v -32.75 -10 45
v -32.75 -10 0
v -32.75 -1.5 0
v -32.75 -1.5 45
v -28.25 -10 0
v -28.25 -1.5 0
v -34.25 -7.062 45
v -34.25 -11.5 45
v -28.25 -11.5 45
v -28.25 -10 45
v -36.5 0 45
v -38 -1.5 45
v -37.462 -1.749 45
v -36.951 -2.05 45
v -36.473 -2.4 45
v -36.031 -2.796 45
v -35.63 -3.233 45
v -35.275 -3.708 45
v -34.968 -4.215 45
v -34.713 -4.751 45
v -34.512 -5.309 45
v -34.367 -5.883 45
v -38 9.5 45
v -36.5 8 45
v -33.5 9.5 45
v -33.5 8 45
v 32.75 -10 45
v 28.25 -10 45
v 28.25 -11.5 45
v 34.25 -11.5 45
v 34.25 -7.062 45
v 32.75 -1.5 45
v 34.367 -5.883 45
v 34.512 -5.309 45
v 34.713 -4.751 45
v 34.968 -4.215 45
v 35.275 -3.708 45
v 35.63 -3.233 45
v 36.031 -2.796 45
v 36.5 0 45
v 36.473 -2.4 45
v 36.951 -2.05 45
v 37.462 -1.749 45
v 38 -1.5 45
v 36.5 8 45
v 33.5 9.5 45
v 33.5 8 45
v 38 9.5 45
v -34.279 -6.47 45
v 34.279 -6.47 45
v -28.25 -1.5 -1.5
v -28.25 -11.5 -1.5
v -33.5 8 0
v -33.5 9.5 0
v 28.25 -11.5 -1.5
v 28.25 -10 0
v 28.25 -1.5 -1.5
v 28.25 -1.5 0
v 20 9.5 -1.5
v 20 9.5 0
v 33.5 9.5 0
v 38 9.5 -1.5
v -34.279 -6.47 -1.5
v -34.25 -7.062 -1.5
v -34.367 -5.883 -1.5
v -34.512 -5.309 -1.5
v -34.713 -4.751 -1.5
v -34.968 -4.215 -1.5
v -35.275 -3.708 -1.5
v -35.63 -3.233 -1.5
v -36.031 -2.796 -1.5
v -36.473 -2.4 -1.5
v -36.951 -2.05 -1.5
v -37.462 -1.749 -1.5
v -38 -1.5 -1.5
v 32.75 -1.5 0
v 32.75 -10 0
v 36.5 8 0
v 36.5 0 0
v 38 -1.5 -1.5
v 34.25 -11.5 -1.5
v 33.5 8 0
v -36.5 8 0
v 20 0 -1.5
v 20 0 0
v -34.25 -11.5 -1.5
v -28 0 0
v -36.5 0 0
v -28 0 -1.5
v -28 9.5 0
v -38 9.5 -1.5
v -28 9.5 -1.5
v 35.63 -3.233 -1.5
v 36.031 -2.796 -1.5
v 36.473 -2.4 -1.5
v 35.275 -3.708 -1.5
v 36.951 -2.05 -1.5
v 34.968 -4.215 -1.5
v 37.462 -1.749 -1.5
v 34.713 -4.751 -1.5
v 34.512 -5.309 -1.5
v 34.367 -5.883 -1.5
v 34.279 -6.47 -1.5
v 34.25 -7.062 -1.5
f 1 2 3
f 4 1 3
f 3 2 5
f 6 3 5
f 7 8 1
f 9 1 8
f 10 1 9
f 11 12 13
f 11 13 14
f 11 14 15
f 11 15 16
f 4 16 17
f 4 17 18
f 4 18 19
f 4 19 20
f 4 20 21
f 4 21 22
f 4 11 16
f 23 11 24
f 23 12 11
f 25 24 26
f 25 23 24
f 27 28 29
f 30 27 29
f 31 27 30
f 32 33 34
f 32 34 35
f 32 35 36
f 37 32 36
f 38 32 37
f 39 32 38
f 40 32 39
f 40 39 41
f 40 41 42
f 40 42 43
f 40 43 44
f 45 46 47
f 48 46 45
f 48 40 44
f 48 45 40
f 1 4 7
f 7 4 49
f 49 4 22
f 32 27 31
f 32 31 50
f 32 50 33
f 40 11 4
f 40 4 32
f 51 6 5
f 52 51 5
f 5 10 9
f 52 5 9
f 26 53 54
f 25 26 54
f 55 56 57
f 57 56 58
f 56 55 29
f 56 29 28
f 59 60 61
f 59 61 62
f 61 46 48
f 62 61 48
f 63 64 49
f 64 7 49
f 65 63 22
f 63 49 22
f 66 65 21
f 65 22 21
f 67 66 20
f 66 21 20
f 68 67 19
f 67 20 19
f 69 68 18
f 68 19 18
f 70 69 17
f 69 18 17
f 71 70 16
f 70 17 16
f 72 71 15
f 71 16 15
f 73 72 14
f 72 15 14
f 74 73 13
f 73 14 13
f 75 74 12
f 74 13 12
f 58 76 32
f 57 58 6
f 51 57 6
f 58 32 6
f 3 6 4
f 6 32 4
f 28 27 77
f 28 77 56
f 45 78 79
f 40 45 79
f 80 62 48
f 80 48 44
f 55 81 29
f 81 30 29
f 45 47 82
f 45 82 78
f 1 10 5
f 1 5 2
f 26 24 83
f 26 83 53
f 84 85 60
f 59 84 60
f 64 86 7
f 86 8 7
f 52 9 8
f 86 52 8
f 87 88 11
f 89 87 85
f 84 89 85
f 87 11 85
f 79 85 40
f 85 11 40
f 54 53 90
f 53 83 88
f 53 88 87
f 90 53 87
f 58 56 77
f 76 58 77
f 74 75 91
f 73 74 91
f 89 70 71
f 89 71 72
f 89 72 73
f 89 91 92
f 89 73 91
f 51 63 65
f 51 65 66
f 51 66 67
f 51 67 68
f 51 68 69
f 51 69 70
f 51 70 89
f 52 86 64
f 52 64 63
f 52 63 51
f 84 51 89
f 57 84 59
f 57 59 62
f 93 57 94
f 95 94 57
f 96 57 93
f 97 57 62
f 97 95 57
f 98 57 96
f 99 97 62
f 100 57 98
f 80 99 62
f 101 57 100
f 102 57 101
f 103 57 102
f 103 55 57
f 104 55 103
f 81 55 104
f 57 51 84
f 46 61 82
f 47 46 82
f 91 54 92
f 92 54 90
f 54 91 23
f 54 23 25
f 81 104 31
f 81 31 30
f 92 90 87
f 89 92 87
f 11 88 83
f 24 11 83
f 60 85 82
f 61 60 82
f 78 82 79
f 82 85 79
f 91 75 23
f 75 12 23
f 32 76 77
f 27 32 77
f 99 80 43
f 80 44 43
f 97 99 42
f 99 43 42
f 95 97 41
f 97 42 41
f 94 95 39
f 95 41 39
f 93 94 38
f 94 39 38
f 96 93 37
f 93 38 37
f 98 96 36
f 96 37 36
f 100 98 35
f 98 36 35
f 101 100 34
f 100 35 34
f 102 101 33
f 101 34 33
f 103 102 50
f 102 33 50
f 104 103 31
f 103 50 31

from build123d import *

# Parameters (mm, degrees)
F1_DEPTH    = 45
F2_T1_DEPTH = 45
F3_W        = 4.5
F3_H        = 8.5
F4_DEPTH    = 1.5


# Not quite as in the source:
# - a fillet or chamfer that OpenCascade refuses, or shapes differently, is made with other operations: its cross-section is extruded or revolved along the edge and cut away or added


with BuildPart() as f1:
    # F0 (on Top) → F1 (new body)
    with BuildSketch(Plane.XY):
        Polygon((36.5, 0), (0, 0), (-36.5, 0), (-36.5, 8), (-33.5, 8), (-33.5, 9.5), (-38, 9.5), (-38, -1.5), (-34.25, -1.5), (-32.75, -1.5), (0, -1.5), (32.75, -1.5), (34.25, -1.5), (38, -1.5), (38, 9.5), (33.5, 9.5), (33.5, 8), (36.5, 8), align=None)
        Polygon((-32.75, -1.5), (-34.25, -1.5), (-34.25, -11.5), (-28.25, -11.5), (-28.25, -10), (-32.75, -10), align=None)
        Polygon((34.25, -11.5), (34.25, -1.5), (32.75, -1.5), (32.75, -10), (28.25, -10), (28.25, -11.5), align=None)
    extrude(amount=F1_DEPTH)

    # F2: fillet of radius 6 on 2 edges, made by hand

    # F2_s2 → F2_t1 (join)
    with BuildSketch(Plane.XY):
        with BuildLine():
            ThreePointArc((-38, -1.5), (-35.2750628145, -3.7080468991), (-34.25, -7.0621488653))
            Line((-34.25, -7.0621488653), (-34.25, -1.5))
            Line((-34.25, -1.5), (-38, -1.5))
        make_face()
        with BuildLine():
            ThreePointArc((34.25, -7.0621488653), (35.2750628145, -3.7080468991), (38, -1.5))
            Line((38, -1.5), (34.25, -1.5))
            Line((34.25, -1.5), (34.25, -7.0621488653))
        make_face()
    extrude(amount=F2_T1_DEPTH)

    # F3 (on face) → F4 (join)
    with BuildSketch(Plane(origin=(0, 0, 0), x_dir=(1, 0, 0), z_dir=(0, 0, -1))):
        with BuildLine():
            Line((-32.75, 10), (-28.25, 10))
            Line((-28.25, 10), (-28.25, 11.5))
            Line((-28.25, 11.5), (-34.25, 11.5))
            Line((-34.25, 11.5), (-34.25, 7.0621488653))
            ThreePointArc((-34.25, 7.0621488653), (-35.2750628145, 3.7080468991), (-38, 1.5))
            Line((-38, 1.5), (-38, -9.5))
            Line((-38, -9.5), (-33.5, -9.5))
            Line((-33.5, -9.5), (-33.5, -8))
            Line((-33.5, -8), (-36.5, -8))
            Line((-36.5, -8), (-36.5, 0))
            Line((-36.5, 0), (-28, 0))
            Line((-28, 0), (20, 0))
            Line((20, 0), (36.5, 0))
            Line((36.5, 0), (36.5, -8))
            Line((36.5, -8), (33.5, -8))
            Line((33.5, -8), (33.5, -9.5))
            Line((33.5, -9.5), (38, -9.5))
            Line((38, -9.5), (38, 1.5))
            ThreePointArc((38, 1.5), (35.2750628145, 3.7080468991), (34.25, 7.0621488653))
            Line((34.25, 7.0621488653), (34.25, 11.5))
            Line((34.25, 11.5), (28.25, 11.5))
            Line((28.25, 11.5), (28.25, 10))
            Line((28.25, 10), (32.75, 10))
            Line((32.75, 10), (32.75, 1.5))
            Line((32.75, 1.5), (28.25, 1.5))
            Line((28.25, 1.5), (-28.25, 1.5))
            Line((-28.25, 1.5), (-32.75, 1.5))
            Line((-32.75, 1.5), (-32.75, 10))
        make_face()
        with Locations((-30.5, 5.75)):
            Rectangle(F3_W, F3_H)
        Polygon((-33.5, -8), (-33.5, -9.5), (-28, -9.5), (-28, 0), (-36.5, 0), (-36.5, -8), align=None)
        with Locations((30.5, 5.75)):
            Rectangle(F3_W, F3_H)
        Polygon((20, -9.5), (33.5, -9.5), (33.5, -8), (36.5, -8), (36.5, 0), (20, 0), align=None)
    extrude(amount=F4_DEPTH)


solid = f1.part
